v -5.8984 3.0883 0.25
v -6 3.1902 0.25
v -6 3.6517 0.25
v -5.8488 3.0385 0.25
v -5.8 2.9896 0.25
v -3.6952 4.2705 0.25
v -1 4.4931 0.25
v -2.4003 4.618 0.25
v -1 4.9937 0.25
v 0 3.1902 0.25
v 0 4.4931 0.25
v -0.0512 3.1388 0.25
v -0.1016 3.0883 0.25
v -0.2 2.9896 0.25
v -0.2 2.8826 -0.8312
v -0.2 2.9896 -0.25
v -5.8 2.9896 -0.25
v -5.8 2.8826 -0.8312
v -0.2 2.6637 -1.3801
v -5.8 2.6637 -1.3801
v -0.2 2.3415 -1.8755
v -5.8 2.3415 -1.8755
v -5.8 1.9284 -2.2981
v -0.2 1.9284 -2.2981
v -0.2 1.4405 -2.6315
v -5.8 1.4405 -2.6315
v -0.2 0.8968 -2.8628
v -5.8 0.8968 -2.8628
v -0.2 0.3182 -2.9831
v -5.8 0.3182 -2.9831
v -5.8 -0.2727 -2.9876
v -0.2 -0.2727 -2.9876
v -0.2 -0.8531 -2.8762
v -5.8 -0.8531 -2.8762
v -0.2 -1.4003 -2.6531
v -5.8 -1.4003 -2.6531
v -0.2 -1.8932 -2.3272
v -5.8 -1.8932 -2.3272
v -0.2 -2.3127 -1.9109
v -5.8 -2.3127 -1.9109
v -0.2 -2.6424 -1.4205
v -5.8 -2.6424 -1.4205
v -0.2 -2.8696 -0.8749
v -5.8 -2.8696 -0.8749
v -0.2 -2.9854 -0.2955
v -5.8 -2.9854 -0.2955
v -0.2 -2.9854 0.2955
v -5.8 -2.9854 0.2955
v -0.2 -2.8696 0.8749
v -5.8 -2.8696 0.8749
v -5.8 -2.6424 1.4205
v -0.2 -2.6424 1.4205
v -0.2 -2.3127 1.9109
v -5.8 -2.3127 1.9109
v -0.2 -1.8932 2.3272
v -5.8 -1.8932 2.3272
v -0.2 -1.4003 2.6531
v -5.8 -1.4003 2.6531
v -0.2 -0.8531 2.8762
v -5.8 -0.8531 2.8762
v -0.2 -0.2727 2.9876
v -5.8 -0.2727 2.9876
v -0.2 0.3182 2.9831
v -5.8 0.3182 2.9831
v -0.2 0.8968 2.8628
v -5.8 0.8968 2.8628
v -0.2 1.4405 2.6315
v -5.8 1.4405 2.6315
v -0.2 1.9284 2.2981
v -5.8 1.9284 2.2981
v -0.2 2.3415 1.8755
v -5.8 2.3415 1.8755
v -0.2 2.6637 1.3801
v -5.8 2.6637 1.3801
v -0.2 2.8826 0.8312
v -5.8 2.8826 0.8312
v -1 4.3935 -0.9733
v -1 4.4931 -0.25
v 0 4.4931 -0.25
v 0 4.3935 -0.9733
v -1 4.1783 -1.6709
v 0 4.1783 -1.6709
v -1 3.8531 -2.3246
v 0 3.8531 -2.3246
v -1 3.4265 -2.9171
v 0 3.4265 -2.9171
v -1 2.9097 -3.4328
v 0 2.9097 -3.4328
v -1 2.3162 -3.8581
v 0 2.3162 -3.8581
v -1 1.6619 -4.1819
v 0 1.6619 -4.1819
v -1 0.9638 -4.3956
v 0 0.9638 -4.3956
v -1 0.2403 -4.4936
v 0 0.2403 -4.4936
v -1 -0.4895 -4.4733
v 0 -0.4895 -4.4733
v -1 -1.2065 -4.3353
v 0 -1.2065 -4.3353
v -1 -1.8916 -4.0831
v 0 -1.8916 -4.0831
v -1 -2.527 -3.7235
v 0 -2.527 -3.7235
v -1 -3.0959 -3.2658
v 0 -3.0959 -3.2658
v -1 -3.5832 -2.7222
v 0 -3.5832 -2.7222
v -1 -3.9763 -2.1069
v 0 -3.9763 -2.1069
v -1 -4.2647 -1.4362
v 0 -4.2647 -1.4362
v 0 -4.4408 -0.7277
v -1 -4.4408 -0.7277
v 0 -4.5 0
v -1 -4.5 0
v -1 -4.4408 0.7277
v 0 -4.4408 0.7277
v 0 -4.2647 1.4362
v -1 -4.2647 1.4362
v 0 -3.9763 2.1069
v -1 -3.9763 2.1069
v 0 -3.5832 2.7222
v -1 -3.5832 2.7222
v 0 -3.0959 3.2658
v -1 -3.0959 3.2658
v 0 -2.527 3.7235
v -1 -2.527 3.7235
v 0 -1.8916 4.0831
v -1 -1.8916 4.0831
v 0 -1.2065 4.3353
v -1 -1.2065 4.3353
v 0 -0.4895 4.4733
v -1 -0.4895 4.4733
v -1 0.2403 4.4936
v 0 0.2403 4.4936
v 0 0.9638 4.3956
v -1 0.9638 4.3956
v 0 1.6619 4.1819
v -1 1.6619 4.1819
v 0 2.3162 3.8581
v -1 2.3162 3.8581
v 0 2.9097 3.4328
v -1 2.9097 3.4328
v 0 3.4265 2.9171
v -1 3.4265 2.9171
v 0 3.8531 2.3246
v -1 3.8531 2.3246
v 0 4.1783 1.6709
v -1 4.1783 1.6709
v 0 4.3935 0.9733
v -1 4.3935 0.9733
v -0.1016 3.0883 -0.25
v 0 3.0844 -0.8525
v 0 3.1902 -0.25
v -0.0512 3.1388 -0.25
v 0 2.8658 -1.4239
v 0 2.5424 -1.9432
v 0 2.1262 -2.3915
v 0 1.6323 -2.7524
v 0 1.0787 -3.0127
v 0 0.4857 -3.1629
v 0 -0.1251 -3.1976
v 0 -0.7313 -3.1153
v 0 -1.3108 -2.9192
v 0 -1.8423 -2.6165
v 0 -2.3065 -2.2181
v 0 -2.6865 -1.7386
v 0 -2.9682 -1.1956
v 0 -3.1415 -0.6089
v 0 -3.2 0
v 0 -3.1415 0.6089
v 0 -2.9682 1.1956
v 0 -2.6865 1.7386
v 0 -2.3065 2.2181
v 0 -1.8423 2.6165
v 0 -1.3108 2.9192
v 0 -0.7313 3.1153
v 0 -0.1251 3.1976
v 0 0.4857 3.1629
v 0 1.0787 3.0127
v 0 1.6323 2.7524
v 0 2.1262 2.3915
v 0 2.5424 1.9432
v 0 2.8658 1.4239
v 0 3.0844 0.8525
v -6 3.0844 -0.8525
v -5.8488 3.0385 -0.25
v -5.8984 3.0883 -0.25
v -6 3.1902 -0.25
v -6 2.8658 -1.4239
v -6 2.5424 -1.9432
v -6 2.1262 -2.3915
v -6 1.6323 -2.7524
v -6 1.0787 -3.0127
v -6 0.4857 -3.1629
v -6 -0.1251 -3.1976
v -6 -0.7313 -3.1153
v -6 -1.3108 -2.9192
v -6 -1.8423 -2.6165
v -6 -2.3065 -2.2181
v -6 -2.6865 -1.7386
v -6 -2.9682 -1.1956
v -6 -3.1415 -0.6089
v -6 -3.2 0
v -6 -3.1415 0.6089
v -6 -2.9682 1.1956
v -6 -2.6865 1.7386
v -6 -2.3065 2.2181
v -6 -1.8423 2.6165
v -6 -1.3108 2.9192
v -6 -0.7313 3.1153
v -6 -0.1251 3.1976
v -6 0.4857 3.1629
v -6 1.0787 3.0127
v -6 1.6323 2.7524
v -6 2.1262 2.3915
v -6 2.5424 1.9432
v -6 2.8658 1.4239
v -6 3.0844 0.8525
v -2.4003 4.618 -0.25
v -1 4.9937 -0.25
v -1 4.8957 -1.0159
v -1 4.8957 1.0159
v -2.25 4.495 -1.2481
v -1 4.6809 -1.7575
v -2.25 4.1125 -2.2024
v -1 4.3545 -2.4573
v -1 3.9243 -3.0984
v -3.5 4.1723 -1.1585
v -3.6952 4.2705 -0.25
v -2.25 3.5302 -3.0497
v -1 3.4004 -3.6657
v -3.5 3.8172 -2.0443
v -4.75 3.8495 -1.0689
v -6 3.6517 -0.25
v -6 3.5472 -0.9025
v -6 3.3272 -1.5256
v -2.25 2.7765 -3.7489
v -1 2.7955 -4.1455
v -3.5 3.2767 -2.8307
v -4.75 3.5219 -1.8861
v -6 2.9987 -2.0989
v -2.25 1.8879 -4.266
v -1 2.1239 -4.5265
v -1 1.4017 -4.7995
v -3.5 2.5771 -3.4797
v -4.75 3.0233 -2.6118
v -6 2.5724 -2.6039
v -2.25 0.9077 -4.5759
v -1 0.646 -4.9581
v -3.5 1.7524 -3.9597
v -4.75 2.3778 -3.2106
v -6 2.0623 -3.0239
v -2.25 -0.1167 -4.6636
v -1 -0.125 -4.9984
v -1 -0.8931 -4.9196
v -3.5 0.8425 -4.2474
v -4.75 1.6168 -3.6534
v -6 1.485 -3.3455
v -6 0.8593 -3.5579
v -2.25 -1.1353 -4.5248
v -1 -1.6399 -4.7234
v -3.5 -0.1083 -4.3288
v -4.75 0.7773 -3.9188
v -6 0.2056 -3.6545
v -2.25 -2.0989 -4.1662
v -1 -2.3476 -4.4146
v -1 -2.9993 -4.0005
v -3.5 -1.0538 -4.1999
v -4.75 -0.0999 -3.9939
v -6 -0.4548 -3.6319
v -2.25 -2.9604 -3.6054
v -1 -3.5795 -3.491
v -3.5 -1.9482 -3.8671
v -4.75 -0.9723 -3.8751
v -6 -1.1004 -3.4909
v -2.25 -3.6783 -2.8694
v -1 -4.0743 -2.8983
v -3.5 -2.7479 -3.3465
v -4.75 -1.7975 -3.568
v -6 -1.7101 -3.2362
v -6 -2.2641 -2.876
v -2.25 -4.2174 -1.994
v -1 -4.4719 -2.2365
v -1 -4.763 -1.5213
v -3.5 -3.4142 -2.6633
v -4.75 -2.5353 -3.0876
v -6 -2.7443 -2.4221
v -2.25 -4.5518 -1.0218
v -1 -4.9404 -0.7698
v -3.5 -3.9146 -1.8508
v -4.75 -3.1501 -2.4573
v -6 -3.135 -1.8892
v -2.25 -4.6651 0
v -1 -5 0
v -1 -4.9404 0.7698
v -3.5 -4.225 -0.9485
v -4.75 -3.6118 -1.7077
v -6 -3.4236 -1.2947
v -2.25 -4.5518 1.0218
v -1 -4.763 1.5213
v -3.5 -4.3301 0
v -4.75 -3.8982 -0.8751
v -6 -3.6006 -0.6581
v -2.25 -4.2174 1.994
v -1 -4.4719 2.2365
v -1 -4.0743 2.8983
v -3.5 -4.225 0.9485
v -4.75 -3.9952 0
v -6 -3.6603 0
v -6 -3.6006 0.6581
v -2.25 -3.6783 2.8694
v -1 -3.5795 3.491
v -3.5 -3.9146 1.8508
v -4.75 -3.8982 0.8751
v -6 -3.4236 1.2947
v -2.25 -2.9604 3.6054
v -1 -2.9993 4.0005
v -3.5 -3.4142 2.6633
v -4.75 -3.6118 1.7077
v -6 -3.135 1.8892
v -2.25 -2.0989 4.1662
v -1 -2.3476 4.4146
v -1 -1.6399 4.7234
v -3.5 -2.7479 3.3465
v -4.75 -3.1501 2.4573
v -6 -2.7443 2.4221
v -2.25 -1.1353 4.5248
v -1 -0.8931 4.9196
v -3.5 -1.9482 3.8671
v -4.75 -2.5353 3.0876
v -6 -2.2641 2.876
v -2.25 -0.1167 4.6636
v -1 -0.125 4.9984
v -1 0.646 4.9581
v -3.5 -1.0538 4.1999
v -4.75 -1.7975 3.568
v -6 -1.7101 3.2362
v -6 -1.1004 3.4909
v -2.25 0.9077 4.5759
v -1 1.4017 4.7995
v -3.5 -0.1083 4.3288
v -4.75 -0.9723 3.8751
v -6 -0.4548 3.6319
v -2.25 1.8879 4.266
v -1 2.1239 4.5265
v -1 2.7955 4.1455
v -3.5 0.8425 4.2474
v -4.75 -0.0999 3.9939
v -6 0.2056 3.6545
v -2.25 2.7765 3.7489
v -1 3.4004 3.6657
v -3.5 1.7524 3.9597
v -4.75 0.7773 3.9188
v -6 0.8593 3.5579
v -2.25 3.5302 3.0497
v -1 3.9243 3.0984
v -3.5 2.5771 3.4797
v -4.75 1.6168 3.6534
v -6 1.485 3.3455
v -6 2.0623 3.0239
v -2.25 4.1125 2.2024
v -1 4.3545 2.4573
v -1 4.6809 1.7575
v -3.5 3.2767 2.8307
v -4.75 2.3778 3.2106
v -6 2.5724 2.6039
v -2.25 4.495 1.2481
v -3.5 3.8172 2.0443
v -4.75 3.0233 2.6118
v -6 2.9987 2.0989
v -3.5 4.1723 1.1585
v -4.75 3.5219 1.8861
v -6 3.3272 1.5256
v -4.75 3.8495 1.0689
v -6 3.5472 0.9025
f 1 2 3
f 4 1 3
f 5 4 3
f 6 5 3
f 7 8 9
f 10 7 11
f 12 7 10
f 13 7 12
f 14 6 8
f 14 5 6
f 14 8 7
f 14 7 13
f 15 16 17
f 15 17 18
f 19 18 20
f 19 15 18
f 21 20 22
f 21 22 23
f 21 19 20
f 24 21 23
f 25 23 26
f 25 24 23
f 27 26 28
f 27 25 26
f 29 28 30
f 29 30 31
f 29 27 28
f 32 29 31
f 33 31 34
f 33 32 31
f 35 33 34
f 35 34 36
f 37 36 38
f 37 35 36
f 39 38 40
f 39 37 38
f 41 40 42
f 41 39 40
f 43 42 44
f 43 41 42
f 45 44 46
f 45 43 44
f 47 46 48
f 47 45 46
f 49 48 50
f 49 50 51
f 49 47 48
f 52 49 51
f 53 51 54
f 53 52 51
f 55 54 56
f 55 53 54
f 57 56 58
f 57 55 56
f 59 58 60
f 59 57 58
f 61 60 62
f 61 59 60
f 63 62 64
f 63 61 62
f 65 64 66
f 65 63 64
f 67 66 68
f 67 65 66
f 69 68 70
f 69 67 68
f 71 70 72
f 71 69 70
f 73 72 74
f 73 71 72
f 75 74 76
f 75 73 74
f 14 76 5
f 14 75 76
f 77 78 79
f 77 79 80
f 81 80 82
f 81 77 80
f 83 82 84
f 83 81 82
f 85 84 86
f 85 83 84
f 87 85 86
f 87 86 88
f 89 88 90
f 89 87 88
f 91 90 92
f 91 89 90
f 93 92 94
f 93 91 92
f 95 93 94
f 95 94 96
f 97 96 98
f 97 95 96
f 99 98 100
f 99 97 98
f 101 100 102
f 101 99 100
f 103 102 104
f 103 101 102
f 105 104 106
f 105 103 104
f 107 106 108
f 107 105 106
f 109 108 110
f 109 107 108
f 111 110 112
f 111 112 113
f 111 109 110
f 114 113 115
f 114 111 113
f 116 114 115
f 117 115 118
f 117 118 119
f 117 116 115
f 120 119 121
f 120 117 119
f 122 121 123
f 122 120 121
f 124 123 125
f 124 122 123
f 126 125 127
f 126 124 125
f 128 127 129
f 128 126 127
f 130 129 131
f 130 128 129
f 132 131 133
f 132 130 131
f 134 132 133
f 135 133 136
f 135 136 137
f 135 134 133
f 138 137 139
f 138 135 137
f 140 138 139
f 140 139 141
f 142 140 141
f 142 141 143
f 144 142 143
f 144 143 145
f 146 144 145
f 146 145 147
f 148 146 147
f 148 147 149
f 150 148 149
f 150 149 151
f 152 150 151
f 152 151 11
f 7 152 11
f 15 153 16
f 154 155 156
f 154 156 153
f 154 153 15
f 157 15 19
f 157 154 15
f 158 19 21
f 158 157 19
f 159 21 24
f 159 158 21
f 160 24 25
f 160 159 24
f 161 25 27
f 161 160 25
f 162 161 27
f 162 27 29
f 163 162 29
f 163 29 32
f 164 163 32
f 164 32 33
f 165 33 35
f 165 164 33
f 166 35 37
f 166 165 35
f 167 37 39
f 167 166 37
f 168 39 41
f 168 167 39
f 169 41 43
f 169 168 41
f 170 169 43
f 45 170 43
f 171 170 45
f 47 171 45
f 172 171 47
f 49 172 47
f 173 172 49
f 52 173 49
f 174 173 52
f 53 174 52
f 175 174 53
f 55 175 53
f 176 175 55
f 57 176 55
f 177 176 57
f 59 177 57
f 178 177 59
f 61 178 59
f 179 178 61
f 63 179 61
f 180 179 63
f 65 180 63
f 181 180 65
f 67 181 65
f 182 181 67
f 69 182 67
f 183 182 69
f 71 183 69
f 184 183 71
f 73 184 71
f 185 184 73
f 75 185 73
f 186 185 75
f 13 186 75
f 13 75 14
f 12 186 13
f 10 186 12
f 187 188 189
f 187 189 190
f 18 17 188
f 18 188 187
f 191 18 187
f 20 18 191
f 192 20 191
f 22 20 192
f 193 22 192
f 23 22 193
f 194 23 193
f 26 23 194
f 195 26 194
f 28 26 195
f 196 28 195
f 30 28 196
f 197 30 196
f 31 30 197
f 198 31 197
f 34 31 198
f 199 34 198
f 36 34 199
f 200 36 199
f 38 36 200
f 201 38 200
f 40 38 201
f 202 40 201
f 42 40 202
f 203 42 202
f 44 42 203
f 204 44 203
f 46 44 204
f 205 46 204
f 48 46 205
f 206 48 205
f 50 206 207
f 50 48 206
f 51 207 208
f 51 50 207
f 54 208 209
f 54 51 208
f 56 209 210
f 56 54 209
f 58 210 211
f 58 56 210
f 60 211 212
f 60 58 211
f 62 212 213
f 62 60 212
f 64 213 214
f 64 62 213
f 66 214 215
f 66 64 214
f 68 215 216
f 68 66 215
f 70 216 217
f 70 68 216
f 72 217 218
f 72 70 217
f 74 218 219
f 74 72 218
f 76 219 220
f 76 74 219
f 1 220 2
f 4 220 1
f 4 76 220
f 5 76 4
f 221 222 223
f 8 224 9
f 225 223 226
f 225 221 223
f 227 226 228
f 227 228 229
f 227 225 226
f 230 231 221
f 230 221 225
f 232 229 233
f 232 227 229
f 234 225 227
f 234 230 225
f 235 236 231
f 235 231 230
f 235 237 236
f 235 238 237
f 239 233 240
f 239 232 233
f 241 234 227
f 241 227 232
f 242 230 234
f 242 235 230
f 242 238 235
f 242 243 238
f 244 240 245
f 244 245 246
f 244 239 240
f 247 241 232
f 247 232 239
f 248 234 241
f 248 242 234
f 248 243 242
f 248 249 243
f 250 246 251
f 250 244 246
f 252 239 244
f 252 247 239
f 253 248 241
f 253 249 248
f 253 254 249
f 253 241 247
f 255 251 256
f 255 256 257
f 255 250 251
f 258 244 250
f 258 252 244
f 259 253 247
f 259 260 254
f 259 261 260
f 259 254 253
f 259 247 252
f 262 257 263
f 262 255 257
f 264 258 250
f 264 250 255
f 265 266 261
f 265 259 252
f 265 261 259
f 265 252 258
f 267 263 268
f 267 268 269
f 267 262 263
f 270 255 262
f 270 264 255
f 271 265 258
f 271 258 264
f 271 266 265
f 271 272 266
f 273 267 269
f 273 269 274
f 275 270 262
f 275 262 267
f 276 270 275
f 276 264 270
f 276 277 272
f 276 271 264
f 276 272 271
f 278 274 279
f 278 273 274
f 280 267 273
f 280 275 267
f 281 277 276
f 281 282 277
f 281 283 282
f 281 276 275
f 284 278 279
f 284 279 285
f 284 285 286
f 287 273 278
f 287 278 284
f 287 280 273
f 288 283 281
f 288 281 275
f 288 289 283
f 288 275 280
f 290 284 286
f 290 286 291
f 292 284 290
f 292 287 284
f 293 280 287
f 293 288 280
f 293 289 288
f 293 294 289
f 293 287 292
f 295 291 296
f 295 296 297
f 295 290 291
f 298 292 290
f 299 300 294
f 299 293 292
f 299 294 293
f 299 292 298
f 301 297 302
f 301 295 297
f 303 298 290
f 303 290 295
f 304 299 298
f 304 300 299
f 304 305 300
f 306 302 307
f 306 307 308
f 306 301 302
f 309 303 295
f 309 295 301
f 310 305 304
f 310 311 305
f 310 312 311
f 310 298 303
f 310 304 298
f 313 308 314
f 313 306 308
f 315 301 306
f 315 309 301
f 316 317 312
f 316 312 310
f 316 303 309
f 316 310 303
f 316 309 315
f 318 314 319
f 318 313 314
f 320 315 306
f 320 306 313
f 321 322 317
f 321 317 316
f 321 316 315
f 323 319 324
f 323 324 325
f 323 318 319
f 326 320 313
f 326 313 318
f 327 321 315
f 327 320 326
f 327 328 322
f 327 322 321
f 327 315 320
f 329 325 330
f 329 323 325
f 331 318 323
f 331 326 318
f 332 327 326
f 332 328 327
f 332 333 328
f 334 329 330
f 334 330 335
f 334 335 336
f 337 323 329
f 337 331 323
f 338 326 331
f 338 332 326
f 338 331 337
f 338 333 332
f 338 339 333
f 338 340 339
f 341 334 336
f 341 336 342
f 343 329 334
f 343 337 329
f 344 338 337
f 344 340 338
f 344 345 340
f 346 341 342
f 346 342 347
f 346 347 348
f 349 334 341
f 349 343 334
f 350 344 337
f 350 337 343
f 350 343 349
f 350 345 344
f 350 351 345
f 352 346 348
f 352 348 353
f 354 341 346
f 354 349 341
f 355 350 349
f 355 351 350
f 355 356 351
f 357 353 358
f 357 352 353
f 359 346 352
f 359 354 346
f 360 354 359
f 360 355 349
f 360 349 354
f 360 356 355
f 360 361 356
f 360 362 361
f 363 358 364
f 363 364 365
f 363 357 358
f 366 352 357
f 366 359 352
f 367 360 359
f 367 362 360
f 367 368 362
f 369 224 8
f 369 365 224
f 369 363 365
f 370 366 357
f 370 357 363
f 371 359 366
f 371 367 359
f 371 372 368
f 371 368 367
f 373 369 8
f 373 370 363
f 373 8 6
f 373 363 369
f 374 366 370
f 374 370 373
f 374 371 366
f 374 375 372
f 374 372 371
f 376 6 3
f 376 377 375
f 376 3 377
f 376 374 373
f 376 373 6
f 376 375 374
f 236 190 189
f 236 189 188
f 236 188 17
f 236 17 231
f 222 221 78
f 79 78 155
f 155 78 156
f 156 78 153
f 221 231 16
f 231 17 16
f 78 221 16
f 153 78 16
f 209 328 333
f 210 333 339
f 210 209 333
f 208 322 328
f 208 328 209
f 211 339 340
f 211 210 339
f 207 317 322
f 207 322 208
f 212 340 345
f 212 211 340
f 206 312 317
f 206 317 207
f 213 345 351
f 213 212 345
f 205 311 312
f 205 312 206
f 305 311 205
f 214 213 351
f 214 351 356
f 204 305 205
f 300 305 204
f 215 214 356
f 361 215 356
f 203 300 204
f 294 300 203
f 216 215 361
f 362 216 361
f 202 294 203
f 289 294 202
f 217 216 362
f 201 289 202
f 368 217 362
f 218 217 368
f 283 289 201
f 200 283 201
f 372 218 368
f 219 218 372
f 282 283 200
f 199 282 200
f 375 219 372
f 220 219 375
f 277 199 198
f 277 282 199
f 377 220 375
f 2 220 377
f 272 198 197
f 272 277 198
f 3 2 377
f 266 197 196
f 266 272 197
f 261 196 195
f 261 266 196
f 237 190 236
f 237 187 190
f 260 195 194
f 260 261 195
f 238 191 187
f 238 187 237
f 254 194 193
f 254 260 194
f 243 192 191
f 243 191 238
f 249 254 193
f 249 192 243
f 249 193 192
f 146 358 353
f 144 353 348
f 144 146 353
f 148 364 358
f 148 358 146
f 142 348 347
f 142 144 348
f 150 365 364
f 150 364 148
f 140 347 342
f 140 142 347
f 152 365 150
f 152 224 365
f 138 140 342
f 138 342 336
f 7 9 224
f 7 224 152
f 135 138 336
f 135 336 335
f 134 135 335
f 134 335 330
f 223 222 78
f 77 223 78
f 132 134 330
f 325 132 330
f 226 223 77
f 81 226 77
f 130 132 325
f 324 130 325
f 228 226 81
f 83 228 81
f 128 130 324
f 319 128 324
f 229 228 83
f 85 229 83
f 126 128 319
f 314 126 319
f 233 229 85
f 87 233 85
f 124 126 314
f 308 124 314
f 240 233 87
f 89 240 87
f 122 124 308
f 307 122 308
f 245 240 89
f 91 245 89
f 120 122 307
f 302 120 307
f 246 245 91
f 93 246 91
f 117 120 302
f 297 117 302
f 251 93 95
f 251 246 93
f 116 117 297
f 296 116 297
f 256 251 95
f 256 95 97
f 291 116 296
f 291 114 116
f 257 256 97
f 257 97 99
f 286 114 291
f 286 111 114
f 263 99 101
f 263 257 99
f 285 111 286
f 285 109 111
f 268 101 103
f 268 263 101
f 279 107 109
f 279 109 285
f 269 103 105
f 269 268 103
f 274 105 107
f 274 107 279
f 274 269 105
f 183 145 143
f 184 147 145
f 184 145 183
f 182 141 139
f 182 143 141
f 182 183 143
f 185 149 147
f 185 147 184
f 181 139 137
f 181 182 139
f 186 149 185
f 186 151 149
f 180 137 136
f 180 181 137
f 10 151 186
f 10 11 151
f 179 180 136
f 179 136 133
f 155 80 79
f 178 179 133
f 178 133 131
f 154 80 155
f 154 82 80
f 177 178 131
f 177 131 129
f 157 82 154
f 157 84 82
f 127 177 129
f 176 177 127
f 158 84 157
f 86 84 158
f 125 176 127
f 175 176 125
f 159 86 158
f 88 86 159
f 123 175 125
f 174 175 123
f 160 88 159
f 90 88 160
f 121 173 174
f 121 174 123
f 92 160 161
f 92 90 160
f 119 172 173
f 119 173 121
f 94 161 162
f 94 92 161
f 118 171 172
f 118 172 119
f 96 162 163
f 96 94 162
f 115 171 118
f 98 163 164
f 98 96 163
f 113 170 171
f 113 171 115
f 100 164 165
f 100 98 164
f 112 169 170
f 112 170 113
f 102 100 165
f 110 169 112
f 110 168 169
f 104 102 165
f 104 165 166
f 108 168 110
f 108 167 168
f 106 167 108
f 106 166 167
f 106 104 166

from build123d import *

# Parameters (mm, degrees)
SKETCH2_W          = 6
SKETCH2_H          = 0.5
CUT_EXTRUDE1_DEPTH = 6


with BuildPart() as part:
    # Sketch1 → Revolve1 (revolve)
    with BuildSketch(Plane.XY):
        Polygon((-5.8, 3), (-0.2, 3), (0, 3.2), (0, 4.5), (-1, 4.5), (-1, 5), (-6, 3.660254038), (-6, 3.2), align=None)
    revolve(axis=Axis((0, 0, 0), (-1, 0, 0)))

    # Sketch2 → Cut-Extrude1 (cut, through all)
    with BuildSketch(Plane(origin=(0, 0, 0), x_dir=(1, 0, 0), z_dir=(0, 1, 0))):
        with Locations((-3, 0)):
            Rectangle(SKETCH2_W, SKETCH2_H)
    extrude(amount=CUT_EXTRUDE1_DEPTH, mode=Mode.SUBTRACT)


solid = part.part
